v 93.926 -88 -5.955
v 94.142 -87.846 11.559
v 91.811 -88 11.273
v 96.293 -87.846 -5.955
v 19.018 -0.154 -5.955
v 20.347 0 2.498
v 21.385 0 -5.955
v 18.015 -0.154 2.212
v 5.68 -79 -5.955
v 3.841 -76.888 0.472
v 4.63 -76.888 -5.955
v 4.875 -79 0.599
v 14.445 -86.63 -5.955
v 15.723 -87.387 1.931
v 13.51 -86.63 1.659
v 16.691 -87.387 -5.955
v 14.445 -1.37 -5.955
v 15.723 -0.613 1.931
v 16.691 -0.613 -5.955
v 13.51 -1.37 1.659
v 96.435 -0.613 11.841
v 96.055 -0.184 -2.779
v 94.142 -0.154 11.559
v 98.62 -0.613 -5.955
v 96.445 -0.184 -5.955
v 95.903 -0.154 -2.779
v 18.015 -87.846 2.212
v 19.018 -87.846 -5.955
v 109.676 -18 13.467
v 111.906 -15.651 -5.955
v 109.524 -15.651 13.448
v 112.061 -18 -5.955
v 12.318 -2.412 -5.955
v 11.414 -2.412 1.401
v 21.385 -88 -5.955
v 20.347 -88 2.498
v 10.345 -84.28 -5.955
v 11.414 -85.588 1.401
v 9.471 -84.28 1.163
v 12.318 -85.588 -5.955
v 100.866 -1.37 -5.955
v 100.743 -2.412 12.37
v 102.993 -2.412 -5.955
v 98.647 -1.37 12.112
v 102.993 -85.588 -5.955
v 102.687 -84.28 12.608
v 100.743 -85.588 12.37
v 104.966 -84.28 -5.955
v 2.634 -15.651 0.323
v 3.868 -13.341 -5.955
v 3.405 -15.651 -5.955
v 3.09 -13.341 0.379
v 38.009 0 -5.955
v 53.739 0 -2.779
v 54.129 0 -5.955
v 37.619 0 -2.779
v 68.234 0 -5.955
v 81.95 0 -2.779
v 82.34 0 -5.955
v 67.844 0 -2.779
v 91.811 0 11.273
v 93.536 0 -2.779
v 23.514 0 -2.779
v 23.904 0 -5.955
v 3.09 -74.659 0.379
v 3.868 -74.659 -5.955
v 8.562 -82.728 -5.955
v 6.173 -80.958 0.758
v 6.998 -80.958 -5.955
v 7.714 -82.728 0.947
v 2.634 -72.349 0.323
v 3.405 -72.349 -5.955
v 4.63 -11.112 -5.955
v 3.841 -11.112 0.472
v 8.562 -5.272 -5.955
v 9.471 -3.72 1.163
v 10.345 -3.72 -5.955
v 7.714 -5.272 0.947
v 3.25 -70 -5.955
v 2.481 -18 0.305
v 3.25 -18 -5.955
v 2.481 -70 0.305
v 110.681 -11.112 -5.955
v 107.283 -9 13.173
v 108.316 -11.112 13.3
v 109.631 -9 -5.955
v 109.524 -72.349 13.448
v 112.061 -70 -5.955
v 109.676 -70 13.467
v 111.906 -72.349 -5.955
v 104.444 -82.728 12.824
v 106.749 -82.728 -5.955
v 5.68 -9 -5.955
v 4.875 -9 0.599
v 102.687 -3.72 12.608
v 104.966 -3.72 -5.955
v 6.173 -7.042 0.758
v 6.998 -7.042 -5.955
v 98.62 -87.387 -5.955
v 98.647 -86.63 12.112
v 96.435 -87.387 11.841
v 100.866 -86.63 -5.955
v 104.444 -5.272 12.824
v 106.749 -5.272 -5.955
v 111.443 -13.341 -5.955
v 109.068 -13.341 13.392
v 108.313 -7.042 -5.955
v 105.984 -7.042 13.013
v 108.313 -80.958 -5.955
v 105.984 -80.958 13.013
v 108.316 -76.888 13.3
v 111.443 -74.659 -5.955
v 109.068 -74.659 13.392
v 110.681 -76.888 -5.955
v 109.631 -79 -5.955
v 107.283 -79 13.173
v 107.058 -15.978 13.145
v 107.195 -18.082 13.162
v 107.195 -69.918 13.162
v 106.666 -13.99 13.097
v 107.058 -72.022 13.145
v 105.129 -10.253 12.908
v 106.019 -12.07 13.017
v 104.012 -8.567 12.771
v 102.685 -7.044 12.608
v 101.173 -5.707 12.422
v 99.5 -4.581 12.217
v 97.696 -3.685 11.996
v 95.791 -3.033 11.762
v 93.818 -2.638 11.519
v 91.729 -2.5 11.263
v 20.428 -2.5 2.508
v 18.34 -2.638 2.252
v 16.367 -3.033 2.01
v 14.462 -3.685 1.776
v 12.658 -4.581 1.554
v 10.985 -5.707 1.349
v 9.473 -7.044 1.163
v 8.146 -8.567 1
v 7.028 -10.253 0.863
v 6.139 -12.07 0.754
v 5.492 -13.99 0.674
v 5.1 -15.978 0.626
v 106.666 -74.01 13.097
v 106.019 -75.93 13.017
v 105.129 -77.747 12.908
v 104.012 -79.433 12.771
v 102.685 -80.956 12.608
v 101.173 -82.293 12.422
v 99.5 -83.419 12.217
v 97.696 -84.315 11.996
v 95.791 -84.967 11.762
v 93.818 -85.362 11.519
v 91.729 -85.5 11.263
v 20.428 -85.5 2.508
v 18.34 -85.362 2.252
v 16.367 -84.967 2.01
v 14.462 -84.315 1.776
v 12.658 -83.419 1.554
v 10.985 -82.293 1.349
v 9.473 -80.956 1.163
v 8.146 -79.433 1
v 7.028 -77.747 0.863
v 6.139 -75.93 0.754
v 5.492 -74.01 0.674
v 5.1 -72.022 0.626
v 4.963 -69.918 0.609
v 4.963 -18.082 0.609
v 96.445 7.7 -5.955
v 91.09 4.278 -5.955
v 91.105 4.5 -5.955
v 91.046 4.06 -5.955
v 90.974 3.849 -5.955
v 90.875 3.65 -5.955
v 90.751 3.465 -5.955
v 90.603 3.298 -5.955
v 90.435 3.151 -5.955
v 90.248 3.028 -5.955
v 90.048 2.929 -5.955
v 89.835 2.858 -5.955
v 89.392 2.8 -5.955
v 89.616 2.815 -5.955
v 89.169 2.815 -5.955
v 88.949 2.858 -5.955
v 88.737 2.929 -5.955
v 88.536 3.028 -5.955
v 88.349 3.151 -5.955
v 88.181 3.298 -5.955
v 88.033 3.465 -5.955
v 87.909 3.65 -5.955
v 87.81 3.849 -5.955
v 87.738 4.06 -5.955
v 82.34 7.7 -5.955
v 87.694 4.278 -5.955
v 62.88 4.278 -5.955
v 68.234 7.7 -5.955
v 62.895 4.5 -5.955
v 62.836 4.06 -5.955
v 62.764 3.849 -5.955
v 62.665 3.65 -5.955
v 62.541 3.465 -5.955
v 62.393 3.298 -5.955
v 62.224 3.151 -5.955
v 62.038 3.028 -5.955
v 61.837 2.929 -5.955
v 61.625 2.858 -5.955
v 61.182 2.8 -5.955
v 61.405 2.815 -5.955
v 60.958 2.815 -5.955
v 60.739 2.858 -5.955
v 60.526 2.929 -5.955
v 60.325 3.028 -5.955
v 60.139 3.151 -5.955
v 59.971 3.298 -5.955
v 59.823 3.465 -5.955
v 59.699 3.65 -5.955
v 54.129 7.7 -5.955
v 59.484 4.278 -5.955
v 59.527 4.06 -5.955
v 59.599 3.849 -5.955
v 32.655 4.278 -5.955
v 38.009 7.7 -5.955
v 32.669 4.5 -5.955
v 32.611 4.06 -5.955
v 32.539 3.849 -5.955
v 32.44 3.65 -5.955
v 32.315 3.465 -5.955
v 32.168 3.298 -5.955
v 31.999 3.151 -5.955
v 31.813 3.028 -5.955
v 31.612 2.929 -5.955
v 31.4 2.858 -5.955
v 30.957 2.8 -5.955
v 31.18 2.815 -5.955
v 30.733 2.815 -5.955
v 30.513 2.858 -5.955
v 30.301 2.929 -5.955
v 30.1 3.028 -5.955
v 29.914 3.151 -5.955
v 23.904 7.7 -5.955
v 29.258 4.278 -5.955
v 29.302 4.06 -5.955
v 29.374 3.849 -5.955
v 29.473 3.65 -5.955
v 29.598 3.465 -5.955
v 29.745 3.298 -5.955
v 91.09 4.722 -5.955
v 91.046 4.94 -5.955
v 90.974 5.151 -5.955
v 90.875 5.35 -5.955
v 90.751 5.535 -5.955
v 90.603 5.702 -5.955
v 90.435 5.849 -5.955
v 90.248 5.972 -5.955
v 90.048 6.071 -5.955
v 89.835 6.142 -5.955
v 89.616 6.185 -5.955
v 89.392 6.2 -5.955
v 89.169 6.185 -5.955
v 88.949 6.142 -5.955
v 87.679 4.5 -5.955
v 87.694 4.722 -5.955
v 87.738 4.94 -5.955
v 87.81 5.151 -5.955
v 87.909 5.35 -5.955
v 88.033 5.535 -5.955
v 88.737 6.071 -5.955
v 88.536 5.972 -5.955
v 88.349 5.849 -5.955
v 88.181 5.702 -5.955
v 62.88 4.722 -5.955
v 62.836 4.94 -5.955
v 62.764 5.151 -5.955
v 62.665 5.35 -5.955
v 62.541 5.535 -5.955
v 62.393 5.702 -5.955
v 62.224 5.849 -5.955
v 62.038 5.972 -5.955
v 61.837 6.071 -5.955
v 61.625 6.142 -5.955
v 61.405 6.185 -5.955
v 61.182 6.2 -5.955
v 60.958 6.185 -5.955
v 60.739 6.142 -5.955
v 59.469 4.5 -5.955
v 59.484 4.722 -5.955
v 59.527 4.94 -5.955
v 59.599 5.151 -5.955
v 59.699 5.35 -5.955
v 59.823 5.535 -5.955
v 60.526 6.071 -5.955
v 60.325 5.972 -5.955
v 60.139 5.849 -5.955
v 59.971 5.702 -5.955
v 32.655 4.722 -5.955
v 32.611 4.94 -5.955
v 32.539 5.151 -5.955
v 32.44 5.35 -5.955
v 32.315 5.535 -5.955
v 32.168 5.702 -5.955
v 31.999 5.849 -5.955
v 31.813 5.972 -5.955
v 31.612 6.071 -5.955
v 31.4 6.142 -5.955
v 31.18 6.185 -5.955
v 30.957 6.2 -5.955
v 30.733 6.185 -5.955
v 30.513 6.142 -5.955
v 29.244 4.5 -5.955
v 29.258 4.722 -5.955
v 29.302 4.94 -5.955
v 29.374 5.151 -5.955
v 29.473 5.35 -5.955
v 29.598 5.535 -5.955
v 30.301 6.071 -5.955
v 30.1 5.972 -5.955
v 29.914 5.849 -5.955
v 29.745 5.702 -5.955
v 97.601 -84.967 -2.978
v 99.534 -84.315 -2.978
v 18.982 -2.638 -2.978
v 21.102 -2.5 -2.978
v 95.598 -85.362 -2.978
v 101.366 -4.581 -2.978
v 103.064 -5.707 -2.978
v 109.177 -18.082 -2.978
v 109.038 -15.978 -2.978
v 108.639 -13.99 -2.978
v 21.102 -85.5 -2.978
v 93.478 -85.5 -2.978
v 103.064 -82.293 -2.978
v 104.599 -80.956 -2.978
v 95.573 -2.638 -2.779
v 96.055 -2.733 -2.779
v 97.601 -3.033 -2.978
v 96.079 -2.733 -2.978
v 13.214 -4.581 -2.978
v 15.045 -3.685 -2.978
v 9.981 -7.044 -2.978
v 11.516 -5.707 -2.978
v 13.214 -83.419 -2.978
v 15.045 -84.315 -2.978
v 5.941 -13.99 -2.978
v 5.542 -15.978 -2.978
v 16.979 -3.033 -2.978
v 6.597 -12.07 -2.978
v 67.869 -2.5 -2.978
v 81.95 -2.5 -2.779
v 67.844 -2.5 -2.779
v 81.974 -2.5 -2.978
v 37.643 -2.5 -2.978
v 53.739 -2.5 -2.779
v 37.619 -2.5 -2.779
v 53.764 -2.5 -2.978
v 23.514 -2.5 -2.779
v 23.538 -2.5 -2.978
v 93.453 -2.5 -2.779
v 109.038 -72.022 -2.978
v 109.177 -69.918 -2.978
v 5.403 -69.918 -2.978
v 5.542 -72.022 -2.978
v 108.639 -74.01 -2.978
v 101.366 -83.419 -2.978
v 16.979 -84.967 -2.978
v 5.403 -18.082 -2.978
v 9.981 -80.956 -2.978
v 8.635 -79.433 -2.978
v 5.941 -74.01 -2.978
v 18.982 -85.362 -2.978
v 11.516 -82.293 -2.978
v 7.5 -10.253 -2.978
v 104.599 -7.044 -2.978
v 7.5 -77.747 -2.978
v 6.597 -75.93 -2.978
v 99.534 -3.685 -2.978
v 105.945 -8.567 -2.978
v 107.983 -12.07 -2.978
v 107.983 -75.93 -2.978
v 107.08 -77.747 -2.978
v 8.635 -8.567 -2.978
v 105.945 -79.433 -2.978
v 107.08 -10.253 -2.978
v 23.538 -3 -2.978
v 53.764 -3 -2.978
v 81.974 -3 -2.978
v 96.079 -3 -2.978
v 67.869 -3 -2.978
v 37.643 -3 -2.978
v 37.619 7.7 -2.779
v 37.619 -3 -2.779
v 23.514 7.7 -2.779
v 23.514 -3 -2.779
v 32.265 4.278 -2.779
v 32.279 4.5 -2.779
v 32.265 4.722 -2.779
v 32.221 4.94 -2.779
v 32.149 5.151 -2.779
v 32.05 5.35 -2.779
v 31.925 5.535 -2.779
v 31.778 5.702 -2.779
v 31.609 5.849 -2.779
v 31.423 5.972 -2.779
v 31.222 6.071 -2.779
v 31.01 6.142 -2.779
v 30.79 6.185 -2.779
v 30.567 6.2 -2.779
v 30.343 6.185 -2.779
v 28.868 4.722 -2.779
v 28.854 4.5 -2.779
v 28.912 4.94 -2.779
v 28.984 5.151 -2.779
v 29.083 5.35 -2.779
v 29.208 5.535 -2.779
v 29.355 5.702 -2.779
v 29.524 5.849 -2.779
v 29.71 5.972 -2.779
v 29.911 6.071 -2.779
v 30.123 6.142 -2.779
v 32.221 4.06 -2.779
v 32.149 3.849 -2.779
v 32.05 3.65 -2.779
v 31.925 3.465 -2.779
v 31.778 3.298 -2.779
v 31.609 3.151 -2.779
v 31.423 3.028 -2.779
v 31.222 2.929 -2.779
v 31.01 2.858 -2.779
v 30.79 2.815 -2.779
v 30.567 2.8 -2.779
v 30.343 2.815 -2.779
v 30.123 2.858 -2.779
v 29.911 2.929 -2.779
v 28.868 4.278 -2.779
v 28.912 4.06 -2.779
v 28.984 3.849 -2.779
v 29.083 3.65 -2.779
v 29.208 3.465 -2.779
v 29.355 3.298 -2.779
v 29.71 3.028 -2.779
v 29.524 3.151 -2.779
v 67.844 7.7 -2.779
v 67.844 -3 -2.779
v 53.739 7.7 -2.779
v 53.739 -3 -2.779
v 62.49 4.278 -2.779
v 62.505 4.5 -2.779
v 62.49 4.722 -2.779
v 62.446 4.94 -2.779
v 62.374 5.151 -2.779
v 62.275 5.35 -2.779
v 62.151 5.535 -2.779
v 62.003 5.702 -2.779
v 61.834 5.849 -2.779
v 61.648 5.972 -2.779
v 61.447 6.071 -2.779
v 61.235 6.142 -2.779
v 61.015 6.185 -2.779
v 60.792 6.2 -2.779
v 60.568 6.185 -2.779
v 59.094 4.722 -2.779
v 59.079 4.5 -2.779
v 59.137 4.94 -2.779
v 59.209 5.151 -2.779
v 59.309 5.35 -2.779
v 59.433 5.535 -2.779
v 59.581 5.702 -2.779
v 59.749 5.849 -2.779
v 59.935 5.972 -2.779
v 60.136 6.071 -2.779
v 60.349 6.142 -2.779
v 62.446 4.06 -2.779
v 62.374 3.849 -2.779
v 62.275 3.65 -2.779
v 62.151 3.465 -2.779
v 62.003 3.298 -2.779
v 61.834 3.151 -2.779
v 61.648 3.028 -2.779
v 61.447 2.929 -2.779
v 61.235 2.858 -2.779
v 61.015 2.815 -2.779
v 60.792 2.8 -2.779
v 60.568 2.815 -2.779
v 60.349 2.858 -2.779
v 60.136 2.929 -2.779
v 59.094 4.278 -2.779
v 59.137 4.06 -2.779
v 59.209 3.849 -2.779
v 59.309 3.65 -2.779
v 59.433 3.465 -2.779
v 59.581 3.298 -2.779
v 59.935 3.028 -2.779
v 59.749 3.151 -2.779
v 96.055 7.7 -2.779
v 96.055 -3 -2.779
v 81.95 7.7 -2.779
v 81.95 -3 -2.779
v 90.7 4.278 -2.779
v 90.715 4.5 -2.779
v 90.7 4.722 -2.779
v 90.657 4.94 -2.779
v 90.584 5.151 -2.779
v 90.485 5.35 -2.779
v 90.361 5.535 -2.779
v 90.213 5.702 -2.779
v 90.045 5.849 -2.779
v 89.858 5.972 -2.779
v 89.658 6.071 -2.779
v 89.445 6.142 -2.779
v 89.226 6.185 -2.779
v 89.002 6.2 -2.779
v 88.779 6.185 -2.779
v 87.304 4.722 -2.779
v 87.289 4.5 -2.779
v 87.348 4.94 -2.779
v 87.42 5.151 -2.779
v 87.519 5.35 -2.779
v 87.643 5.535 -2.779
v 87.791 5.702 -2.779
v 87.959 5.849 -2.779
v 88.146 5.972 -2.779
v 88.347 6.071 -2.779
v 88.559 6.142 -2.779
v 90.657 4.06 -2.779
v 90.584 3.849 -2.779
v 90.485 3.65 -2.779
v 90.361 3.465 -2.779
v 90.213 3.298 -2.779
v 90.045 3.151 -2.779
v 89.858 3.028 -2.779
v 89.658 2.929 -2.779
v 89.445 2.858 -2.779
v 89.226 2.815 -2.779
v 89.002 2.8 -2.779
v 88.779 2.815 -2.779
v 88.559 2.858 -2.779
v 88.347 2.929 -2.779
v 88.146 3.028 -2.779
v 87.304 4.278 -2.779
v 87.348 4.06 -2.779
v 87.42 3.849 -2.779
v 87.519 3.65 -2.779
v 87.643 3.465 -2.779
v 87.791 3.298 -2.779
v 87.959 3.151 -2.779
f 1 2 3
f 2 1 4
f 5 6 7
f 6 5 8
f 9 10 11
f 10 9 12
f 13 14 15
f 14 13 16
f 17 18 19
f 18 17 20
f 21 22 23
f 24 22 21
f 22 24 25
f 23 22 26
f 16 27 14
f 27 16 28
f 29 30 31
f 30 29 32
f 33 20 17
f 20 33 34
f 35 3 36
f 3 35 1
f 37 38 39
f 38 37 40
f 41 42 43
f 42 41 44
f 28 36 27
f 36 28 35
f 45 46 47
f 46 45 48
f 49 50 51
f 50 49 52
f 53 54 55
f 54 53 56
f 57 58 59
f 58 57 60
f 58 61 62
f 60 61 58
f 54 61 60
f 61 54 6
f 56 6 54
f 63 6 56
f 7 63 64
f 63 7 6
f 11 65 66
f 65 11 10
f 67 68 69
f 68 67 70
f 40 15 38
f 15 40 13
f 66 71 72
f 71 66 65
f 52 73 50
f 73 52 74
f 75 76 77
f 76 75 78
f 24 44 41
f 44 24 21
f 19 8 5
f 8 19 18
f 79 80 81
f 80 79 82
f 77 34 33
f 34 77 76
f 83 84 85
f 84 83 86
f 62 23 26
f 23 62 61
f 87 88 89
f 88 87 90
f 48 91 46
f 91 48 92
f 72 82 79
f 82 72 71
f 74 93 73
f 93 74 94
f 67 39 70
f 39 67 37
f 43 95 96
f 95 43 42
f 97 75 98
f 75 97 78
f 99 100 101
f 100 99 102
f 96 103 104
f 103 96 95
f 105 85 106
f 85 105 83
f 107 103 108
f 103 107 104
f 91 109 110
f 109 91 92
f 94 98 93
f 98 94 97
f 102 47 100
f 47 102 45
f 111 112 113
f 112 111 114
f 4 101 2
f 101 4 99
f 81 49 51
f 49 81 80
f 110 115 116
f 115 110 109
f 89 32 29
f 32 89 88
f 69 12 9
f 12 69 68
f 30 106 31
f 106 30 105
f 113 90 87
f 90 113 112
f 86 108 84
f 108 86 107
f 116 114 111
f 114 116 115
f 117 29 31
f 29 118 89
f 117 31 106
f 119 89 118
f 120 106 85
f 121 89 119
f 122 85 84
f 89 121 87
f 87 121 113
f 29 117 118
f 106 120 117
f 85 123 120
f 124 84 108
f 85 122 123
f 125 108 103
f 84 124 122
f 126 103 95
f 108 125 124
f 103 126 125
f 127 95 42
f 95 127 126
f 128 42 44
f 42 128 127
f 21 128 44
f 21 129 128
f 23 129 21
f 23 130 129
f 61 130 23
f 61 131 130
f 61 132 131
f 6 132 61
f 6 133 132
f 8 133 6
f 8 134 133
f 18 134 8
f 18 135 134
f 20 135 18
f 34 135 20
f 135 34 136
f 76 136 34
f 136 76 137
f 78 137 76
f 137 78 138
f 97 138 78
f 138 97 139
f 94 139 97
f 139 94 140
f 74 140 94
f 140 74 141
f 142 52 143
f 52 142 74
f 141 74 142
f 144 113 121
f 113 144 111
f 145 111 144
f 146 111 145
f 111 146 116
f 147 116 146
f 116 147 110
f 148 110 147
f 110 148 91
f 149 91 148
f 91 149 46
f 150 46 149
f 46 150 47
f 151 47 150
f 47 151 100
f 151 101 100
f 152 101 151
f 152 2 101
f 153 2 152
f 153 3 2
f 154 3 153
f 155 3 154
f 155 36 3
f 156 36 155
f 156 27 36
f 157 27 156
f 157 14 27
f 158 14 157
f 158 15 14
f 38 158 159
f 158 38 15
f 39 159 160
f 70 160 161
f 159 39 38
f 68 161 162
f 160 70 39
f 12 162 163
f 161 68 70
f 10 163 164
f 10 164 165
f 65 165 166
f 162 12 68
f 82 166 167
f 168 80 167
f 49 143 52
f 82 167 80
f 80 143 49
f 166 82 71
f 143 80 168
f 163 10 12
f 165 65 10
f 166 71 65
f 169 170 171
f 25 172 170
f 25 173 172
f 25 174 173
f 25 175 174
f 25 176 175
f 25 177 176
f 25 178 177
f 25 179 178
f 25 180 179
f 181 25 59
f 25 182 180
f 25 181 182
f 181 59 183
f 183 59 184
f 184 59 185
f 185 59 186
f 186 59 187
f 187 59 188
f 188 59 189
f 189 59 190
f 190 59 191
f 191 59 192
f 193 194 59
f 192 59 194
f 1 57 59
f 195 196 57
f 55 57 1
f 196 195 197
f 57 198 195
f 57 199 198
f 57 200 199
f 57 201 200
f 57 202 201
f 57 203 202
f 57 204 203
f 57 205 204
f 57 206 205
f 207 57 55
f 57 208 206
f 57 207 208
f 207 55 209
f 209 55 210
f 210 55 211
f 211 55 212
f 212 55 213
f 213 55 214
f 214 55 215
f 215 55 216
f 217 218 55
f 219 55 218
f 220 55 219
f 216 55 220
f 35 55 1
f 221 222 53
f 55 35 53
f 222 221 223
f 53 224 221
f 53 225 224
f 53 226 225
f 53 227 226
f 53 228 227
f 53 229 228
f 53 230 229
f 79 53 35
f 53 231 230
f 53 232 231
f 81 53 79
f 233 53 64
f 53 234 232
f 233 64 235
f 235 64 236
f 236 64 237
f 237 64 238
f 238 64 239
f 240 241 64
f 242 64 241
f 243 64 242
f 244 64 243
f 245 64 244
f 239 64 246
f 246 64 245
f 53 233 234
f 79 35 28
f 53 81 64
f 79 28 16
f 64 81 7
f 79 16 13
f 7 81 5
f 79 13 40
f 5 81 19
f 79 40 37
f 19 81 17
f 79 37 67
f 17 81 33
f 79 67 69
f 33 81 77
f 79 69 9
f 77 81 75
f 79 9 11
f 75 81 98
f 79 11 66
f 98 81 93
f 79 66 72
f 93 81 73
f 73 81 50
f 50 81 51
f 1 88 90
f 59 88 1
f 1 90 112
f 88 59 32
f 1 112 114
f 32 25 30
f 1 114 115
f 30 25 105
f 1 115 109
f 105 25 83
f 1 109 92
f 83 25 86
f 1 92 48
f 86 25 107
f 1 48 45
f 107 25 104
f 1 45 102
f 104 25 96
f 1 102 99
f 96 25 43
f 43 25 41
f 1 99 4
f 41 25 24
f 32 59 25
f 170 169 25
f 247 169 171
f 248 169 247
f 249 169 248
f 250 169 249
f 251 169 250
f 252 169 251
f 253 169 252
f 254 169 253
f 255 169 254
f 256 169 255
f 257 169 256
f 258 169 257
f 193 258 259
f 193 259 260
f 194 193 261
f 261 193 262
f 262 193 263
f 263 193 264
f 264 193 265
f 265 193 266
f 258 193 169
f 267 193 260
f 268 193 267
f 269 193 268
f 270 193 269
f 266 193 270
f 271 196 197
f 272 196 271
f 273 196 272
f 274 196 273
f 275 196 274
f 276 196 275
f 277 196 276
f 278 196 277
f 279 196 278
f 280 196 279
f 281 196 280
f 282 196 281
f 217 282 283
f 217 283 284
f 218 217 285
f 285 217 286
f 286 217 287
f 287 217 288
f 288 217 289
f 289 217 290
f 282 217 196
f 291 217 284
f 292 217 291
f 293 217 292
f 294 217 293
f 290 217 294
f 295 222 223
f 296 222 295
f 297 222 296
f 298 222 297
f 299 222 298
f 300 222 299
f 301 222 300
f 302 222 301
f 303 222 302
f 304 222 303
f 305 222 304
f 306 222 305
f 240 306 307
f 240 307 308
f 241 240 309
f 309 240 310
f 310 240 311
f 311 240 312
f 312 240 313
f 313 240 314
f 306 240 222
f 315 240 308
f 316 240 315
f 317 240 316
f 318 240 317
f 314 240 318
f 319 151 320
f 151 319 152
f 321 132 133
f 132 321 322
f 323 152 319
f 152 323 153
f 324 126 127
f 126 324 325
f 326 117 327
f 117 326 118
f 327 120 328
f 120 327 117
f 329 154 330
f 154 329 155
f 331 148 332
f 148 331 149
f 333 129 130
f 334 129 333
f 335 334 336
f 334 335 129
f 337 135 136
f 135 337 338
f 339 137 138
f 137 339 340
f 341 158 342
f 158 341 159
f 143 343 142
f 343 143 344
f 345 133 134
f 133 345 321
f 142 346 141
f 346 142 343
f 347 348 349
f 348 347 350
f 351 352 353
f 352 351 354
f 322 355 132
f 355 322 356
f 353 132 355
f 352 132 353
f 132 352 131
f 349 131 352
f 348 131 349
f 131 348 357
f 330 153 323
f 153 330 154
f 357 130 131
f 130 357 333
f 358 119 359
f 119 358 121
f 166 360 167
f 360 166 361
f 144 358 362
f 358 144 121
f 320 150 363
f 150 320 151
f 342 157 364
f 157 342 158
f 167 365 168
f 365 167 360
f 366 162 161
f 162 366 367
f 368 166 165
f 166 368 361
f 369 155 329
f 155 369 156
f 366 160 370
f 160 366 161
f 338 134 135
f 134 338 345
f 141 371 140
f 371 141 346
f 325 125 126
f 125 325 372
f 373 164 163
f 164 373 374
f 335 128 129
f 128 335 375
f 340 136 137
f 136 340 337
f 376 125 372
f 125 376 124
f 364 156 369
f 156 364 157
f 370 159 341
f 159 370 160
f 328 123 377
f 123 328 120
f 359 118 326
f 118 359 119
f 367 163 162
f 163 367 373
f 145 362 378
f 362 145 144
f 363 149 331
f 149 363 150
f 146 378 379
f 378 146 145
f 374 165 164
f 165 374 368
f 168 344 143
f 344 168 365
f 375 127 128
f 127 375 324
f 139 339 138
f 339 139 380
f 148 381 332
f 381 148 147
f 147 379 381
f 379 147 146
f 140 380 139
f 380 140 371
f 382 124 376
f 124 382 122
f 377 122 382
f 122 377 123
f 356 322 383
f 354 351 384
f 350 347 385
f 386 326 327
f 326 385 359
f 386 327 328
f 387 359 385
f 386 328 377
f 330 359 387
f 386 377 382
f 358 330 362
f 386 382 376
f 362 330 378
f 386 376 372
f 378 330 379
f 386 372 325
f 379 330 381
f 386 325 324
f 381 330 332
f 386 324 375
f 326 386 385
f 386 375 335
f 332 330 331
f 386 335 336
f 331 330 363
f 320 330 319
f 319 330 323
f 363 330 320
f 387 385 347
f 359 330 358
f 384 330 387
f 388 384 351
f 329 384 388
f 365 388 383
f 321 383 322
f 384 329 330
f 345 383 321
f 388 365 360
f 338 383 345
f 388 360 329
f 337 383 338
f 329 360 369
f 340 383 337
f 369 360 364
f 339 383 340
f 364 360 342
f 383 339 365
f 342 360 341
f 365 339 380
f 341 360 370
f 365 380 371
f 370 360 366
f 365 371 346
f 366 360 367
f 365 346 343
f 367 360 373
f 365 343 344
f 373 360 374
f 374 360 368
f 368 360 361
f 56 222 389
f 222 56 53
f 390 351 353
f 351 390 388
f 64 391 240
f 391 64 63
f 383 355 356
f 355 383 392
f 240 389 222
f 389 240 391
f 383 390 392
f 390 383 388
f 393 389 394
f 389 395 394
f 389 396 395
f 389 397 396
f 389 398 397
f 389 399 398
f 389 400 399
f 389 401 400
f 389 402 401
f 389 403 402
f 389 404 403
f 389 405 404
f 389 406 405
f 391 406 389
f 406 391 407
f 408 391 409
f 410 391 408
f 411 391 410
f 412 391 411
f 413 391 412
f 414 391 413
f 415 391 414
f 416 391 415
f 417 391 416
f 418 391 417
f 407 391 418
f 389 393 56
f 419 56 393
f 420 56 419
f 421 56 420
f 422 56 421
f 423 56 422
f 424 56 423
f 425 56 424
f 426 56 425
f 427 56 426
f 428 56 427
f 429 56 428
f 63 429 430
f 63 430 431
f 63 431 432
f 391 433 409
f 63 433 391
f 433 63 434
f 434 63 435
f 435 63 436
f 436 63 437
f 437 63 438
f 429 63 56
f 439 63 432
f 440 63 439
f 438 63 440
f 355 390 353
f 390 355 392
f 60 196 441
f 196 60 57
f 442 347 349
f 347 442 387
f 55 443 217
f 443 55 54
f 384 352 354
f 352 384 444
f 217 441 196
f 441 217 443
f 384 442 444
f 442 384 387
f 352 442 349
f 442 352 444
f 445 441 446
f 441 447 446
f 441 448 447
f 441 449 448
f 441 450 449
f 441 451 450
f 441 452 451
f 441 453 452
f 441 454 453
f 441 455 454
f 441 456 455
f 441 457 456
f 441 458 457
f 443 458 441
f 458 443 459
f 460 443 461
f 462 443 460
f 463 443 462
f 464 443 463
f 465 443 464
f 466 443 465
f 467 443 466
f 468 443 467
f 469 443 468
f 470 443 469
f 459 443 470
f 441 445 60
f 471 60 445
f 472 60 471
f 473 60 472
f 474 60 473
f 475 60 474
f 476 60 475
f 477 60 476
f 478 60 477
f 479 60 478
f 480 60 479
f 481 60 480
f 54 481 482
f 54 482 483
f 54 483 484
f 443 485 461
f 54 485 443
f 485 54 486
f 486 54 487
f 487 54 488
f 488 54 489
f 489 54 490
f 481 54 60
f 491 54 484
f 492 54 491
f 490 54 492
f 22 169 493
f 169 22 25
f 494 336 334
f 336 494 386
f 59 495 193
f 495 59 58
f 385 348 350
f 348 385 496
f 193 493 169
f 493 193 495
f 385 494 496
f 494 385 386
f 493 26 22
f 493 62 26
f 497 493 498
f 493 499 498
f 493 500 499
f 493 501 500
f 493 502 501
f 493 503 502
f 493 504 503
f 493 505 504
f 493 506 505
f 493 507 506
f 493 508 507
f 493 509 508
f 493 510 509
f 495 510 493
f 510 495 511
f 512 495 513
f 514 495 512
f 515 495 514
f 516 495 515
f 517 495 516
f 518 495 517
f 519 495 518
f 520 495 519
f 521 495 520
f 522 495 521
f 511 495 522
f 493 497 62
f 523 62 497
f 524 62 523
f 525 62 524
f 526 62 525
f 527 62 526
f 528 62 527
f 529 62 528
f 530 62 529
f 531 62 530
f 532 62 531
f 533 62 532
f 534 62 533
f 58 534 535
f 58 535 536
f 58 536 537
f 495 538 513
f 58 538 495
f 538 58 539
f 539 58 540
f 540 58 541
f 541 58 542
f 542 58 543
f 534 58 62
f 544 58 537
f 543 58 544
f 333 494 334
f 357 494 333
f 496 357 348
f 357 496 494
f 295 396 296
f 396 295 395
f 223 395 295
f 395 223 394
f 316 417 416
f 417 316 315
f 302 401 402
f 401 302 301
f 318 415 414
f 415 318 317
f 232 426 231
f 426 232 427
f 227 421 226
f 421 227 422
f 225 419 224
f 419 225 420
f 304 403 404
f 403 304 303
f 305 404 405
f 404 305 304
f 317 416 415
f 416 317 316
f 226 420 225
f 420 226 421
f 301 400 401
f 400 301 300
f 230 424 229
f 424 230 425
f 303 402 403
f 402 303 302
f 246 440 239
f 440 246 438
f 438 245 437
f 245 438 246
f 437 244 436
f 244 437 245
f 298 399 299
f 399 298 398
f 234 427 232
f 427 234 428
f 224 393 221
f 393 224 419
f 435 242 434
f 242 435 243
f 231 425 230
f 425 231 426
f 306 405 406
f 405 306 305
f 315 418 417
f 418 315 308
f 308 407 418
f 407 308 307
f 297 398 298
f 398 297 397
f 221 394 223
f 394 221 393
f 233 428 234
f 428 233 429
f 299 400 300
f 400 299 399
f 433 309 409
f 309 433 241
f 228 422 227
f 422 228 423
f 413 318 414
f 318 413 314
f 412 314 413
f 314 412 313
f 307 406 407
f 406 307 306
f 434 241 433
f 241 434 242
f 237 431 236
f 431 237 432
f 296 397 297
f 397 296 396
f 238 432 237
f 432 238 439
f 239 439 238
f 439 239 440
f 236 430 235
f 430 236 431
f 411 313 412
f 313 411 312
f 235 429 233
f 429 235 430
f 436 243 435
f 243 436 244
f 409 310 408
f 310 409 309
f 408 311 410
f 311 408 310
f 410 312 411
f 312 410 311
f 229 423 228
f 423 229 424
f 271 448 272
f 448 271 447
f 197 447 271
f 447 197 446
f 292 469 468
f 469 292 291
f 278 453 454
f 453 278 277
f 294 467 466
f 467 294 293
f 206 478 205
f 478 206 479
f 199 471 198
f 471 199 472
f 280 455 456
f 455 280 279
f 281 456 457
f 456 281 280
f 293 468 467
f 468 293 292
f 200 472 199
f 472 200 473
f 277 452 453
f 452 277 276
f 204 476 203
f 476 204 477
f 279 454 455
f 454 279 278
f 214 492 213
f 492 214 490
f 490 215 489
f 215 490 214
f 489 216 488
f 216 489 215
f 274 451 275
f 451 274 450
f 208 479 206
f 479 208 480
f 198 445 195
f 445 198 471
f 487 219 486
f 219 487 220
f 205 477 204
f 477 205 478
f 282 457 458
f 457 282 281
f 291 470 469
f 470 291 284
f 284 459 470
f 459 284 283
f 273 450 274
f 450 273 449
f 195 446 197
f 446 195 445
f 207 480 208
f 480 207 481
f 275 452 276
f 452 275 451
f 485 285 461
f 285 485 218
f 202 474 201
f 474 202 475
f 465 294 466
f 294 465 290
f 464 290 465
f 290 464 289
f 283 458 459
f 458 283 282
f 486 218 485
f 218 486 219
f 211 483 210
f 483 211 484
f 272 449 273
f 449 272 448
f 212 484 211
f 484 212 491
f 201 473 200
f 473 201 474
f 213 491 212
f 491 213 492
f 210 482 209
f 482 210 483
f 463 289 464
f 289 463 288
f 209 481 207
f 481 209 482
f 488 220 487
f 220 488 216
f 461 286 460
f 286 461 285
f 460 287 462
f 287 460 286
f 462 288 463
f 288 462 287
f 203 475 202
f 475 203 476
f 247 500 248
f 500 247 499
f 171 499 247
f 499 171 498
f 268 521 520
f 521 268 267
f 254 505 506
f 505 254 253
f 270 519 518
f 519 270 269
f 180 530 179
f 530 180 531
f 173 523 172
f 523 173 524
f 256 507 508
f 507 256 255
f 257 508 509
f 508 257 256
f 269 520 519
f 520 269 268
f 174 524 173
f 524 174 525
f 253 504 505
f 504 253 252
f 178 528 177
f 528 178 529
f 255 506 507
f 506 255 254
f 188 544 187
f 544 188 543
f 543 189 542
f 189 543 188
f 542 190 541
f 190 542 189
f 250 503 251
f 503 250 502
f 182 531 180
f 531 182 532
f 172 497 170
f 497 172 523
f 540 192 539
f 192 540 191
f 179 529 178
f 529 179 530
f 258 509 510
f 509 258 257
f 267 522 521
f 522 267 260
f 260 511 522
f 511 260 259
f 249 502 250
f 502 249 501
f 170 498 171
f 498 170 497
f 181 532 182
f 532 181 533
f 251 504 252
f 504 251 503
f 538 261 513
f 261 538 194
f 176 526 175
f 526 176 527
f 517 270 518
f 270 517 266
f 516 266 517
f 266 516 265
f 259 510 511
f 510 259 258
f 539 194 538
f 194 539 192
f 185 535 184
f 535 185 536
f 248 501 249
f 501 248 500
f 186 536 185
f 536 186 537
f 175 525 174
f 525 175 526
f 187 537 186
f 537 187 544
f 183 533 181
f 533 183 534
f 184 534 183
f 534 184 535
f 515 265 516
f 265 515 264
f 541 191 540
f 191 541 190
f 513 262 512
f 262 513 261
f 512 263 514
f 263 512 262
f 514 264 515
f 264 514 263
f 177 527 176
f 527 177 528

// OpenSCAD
// file: ../keyball61_outline.scad
// 自動生成: scripts/extract_outline.py による Keyball61 BallSide 底板の実寸データ
// 座標系: 左手ユニットを上から見た形 / 原点=外形バウンディングボックスの南西角 / +Y=奥(北)
// 編集しないこと。再生成: python3 scripts/extract_outline.py <DXF>
plate_w = 142.99;
plate_d = 113.53;
plate_outline = [
  [70.469,105.952],
  [71.227,105.880],
  [80.812,104.031],
  [81.588,103.958],
  [100.075,104.045],
  [100.583,104.091],
  [119.410,107.418],
  [119.914,107.553],
  [136.160,113.466],
  [136.328,113.511],
  [136.502,113.527],
  [136.676,113.511],
  [136.844,113.466],
  [137.002,113.393],
  [137.145,113.293],
  [137.268,113.169],
  [137.368,113.027],
  [137.442,112.869],
  [142.931,97.786],
  [142.980,97.597],
  [142.990,97.401],
  [142.963,97.207],
  [142.898,97.022],
  [142.798,96.853],
  [142.667,96.707],
  [142.510,96.589],
  [142.334,96.505],
  [134.323,93.589],
  [133.849,93.368],
  [133.421,93.068],
  [133.051,92.698],
  [132.751,92.270],
  [132.530,91.796],
  [132.395,91.291],
  [132.349,90.770],
  [132.349,66.014],
  [132.366,65.834],
  [132.414,65.660],
  [132.493,65.498],
  [132.600,65.353],
  [132.731,65.228],
  [132.882,65.130],
  [133.048,65.060],
  [133.215,64.991],
  [133.367,64.892],
  [133.498,64.768],
  [133.604,64.623],
  [133.683,64.461],
  [133.732,64.286],
  [133.748,64.107],
  [133.748,29.050],
  [133.748,6.000],
  [133.729,5.805],
  [133.672,5.618],
  [133.580,5.445],
  [133.455,5.293],
  [133.304,5.169],
  [133.131,5.076],
  [132.943,5.019],
  [132.748,5.000],
  [95.252,5.000],
  [95.056,4.981],
  [94.869,4.925],
  [94.696,4.832],
  [94.544,4.707],
  [94.420,4.556],
  [94.328,4.383],
  [94.271,4.195],
  [94.252,4.001],
  [94.252,3.501],
  [94.232,3.305],
  [94.175,3.118],
  [94.083,2.945],
  [93.959,2.793],
  [93.807,2.669],
  [93.634,2.577],
  [93.447,2.520],
  [93.251,2.500],
  [76.201,2.500],
  [76.006,2.481],
  [75.819,2.424],
  [75.646,2.332],
  [75.494,2.207],
  [75.370,2.056],
  [75.277,1.883],
  [75.220,1.696],
  [75.201,1.500],
  [75.201,1.001],
  [75.182,0.805],
  [75.125,0.617],
  [75.033,0.445],
  [74.908,0.293],
  [74.757,0.169],
  [74.584,0.077],
  [74.396,0.019],
  [74.201,0.000],
  [58.151,0.000],
  [57.977,0.015],
  [57.809,0.061],
  [57.651,0.134],
  [57.508,0.234],
  [57.385,0.358],
  [57.285,0.500],
  [57.211,0.658],
  [57.166,0.827],
  [57.151,1.001],
  [57.151,3.700],
  [57.132,3.895],
  [57.075,4.083],
  [56.982,4.256],
  [56.858,4.407],
  [56.706,4.532],
  [56.534,4.624],
  [56.346,4.681],
  [56.151,4.700],
  [39.101,4.700],
  [38.927,4.715],
  [38.758,4.761],
  [38.600,4.834],
  [38.458,4.935],
  [38.334,5.057],
  [38.235,5.200],
  [38.161,5.358],
  [38.116,5.527],
  [38.101,5.700],
  [38.101,10.700],
  [38.081,10.895],
  [38.024,11.083],
  [37.932,11.256],
  [37.808,11.408],
  [37.656,11.532],
  [37.483,11.624],
  [37.296,11.681],
  [37.101,11.701],
  [19.050,11.701],
  [1.000,11.701],
  [0.805,11.720],
  [0.617,11.777],
  [0.445,11.869],
  [0.293,11.993],
  [0.168,12.145],
  [0.076,12.317],
  [0.019,12.506],
  [0.000,12.701],
  [0.000,104.952],
  [0.015,105.125],
  [0.060,105.294],
  [0.134,105.452],
  [0.234,105.595],
  [0.357,105.718],
  [0.500,105.818],
  [0.658,105.892],
  [0.826,105.937],
  [1.000,105.952],
  [19.050,105.952]
];
// [x, y, 直径] : d=11.3 はボール取出し穴, d=2.08 は M2, d=2.36 はボールケース部
plate_holes = [
  [71.961,95.252,12.0],
  [61.104,103.252,2.5],
  [61.104,87.252,2.5],
  [56.455,61.351,2.2],
  [128.785,88.912,2.2],
  [57.292,18.55,2.2],
  [18.773,87.402,2.2],
  [18.773,30.251,2.2],
  [94.556,21.051,2.2],
  [95.392,61.651,2.2],
  [120.871,101.715,2.2]
];
// file: ../params.scad
// ============================================================
// Keyball61 ラップボード(膝上ケース・固定式) 共通パラメータ
// 座標系: X+ = 右(東), Y+ = 奥(北), Z+ = 上
// 組立座標系(グローバル): 中心 x=0, 手前が y小
// ============================================================

clr = 0.35;           // はめあいクリアランス(片側)

// ---------- 全体レイアウト(固定) ----------
splay        = 10;    // ハの字角(固定)。変更したら全パーツ再印刷
tent_angle   = 7;     // テンティング角(内側が高い)
kb_corner_x  = 45;    // キーボードブロック後内側コーナーの中心からの距離(=後方ギャップの半分)
kb_corner_y  = 238;   // 同コーナーのY

// ---------- サイドピース(キーボードブロック+パームレスト) ----------
kb_wall      = 6;     // ポケット周囲の壁厚
wedge_t0     = 6;     // 楔の最低肉厚(外側端)
palm_w       = 108;   // パームレスト幅。親指側(内側)を削って印刷を安定させる
palm_x0      = 2.5;   // パームの外側エッジ位置(kbフレームx)。外側基準で幅を詰める
palm_d       = 88;    // 同奥行き
palm_overlap = 3;     // キーボードブロックへの食い込み
palm_r       = 18;    // 角R
// ブレース南帯のネジ座/座面が載る内側エッジ沿いの支持アーム
// (パームを削ってもブレース・ブリッジとの接合部を変えないために残す)
palm_arm_w   = 14;    // アーム幅(継ぎ目から西へ)
palm_arm_y0  = -32;   // アーム南端(kbフレームy)
palm_fillet  = 22;    // アーム〜パーム間の凹R(尖り解消の滑らかな輪郭)
// キーボードは「ベッド直接印刷の2mm取付プレート」(mount_plate)に純正ネジで固定し、
// プレートごとポケットに落としてM3x8皿でサイドに固定する。
// (楔内部の座ぐり奥の2mm肉は印刷精度が出ずネジ固定に失敗したため=実印刷での知見)
plate_t      = 2;     // 取付プレート厚(=アクリル板厚。純正ネジ長がそのまま使える)
pocket_depth = 4.6;   // ポケット深さ = plate_t + 縁2.6
// プレート固定ネジ位置(プレート座標系, M3x8皿セルフタップ x4/側)
// 組立順: 先にプレート単体をサイドへ上から固定 → キーボードをΦ8貫通穴経由で下から純正ネジ止め
plate_screws = [[35, 14], [95, 14], [35, 96], [105, 99]];
kb_head_hole_d = 8;   // M2/ボールケースネジ頭の逃げ穴(サイド側, 貫通=下から増し締め可)

ball_hole_d  = 12;    // ボール取出し穴(アクリルは11.3)

// 取付プレートの穴径
m2_hole_d  = 2.4;     // M2クリアランス(プレート側)
bc_hole_d  = 2.8;     // ボールケースネジ(プレート側, アクリルは2.36)

// ボールPCB切り欠き部の逃げ(取付面からさらに掘り下げる深さ)
notch_relief = 4;

// ---------- 中央ブリッジ ----------
bridge_t     = 8;     // ブリッジ板厚
bridge_y0    = 88;    // 南端(ここより手前の中央は開放空間)
bridge_y1    = 250;   // 北端
seam_clr     = 0.5;   // サイドとの隙間
ledge_w      = 25;    // 継手タブ幅(サイド下面のポケットに入る)
ledge_t      = 3.6;   // タブ厚
tab_len      = 26;    // タブの継ぎ目方向長さ(サイド側ポケット天井のブリッジ距離。
                      //  ポケットは前後の壁で両端支持されるのでサポート不要)
joint_screw_ys = [110, 165, 220];  // 継手ネジのY(斜め継ぎ目沿い・片側3本)
joint_screw_inset = 10;            // 楔エッジからネジ中心までの距離
joint_y0 = 95;                     // 連続タブのY範囲
joint_y1 = 235;
// リブ入り連続継手: サイドの連続タブ(凸)の切り欠きに、ブリッジ側ポケット(凹)内の
// リブが噛み合う。リブがポケット天井の中間支柱になり、ブリッジは
// 両端支持の約28mmブリッジ×5区間でサポート不要のまま連続かみ合いにできる
joint_rib_ys = [122.7, 150.9, 179.1, 207.3];  // リブ中心Y(ネジ位置を回避)
joint_rib_w  = 3;                  // リブ幅(サイド側切り欠きは +2*clr)

// ---------- ブレースプレート(上側の左右連結・箱構造化) ----------
// ポッドの上を跨いで左右サイドの内壁上面に渡し、M3x8皿セルフタップ x2/側で固定。
// OLED/ProMicro部(奥側)を避けた範囲に架ける
brace_t       = 3.5;   // プレート厚
brace_y0      = 100;   // 南端
brace_y1      = 230;   // 北端(ケーブル類はブレースの上か切り欠き部を通す)
// TRSジャック(グローバル x≈∓72, y≈181, KiCad基板から実測)のプラグ/ケーブルが
// 降りてくるゾーンを、左右エッジの切り欠きで大きく避ける(H形)
brace_notch_y0 = 168;  // 切り欠きY範囲
brace_notch_y1 = 212;
brace_notch_keep = 37; // 切り欠き部で残す中央帯の半幅
brace_shelf_z = 22.2;  // サイド側座面の高さ(バッテリー版ポッド上面21.4+0.8クリア)
brace_shelf_w = 10;    // 座面幅(継ぎ目から内側へ)
brace_overlap = 9.5;   // プレートが座面に乗る幅(段差壁との隙間はブリッジ継ぎ目と同じ0.5mm)
brace_screw_ys = [108, 154, 221];  // 固定ネジY(片側3本)
// 親指キークラスタの張り出し回避: 南ネジと中央ネジの間のエッジを少し中央寄りに後退
brace_thumb_y0    = 114;  // 回避Y範囲
brace_thumb_y1    = 147;
brace_thumb_inset = 12;   // 継ぎ目から中央側への後退量
brace_screw_inset = 5;        // 継ぎ目からネジ中心までの距離

// M3 (継手・ポッド固定)
m3_hole_d  = 3.4;
m3_cs_d    = 6.8;     // 皿ざぐり径
m3_nut_af  = 5.8;     // 六角ナットポケット対辺(M3ナット5.5+0.3)
m3_nut_t   = 2.9;     // 同深さ

// ---------- Touch ID ポッド ----------
// 実測値(2026-08-14): 基板 85x31x3 / ボタン 16x16x3 / ポート 19x3.1
// 薄型バッテリー 123x30x3 (有りの場合は基板の下に縦積み)
tid_battery = false; // バッテリー版は -D tid_battery=true で生成 (make で両STL生成)
tid_bat_l  = 123;
tid_bat_t  = 3;
tid_bay_w  = 34;    // ベイ幅   (基板短辺31 + 余裕)
tid_bay_d  = tid_battery ? tid_bat_l + 3 : 88;  // ベイ奥行
tid_bay_h  = tid_battery ? 7 : 4;               // 電池3+基板3+余裕 / 基板3+余裕
tid_btn_in_lid = false; // ボタンはケーブル延長してキーボード側に配置予定のため蓋穴なし
                        // (蓋にボタンを出す場合は true に)
tid_btn_w  = 16;    // センサーボタン一辺(正方形) → 蓋の角穴 = +2*clr
tid_btn_x  = 0;     // ベイ中心からのボタン中心オフセットX
tid_btn_y  = -28;   // 同Y(手前が負)。※ボタン実位置に合わせて調整
tid_port_w = 20;    // 充電ポート開口幅(南面, 上開きスロット) 実測19 / 0で無効
tid_port_off = 0;   // ポート左右オフセット(※あとで調整)
tid_pedestal_h = 0; // ボタン下の台座高さ(0=無効)
tid_wall   = 3;
tid_lid_t  = 2.4;

pod_screw_span = 48;  // フランジ穴スパン(ブリッジの穴と一致)
pod_y          = 178; // ブリッジ側の取付穴Y(両バージョン共通・固定)
// バッテリー版はベイが南へ伸びるぶんフランジ穴をオフセットし、
// 取付穴とポッド北端を両バージョンで揃える
pod_flange_off = tid_battery ? 19 : 0;

$fn = 48;
// file: ../lib.scad
// 共通モジュール
include <params.scad>
include <keyball61_outline.scad>

// キーボードブロック外形(kbローカル座標系)
kbw = plate_w + 2 * kb_wall;   // 幅
kbd = plate_d + 2 * kb_wall;   // 奥行き

// ---- テンティング用の傾斜半空間(kbローカル座標系) ----
// 上面平面: z = wedge_t0 + dz + x*tan(tent_angle)  (x=0 が外側=低い側)
module halfspace_below_top(dz = 0) {
    translate([0, 0, wedge_t0 + dz])
        rotate([0, -tent_angle, 0])
            translate([-1000, -500, -2000]) cube([3000, 2000, 2000]);
}
module halfspace_above_top(dz = 0) {
    translate([0, 0, wedge_t0 + dz])
        rotate([0, -tent_angle, 0])
            translate([-1000, -500, 0]) cube([3000, 2000, 2000]);
}

// kbローカルxにおける上面/ポケット床の高さ
function kb_top_z(x) = wedge_t0 + x * tan(tent_angle);
function pocket_floor_z(x) = kb_top_z(x) - pocket_depth;

// 継ぎ目: 左サイドの楔内側エッジのX(グローバル, 正値で返す)
// エッジは (kb_corner_x, kb_corner_y) から南へ向かって splay だけ開く
function seam_x(y) = kb_corner_x + (kb_corner_y - y) * tan(splay);

// ---- プレート外形(左手ユニット・上面視) ----
// DXFの描画は「右手ユニット上面視を180°回転」した状態なので、
// Y反転すると左手ユニット上面視(手前=ボール側, 奥=MCU/USB側)になる
module plate2d(off = 0) {
    translate([0, plate_d]) mirror([0, 1]) {
        if (off > 0) offset(r = off) polygon(plate_outline);
        else polygon(plate_outline);
    }
}

// Y反転済みの穴リスト [x, y, d]
plate_holes_f = [for (h = plate_holes) [h[0], plate_d - h[1], h[2]]];

// ---- 角丸長方形 ----
module rounded_rect(w, d, r) {
    offset(r = r) offset(delta = -r) square([w, d]);
}

// ---- M3 六角ナットポケット 原点=軸, z=0から上へ掘る ----
module m3_nut_pocket() {
    translate([0, 0, m3_nut_t/2 - 0.01])
        cylinder(d = m3_nut_af / cos(30), h = m3_nut_t + 0.02, center = true, $fn = 6);
}

// ---- M3 皿ネジ穴 原点=軸/z=0が頭側表面, 下向きに掘る ----
module m3_countersunk(depth) {
    translate([0, 0, -depth - 0.01]) cylinder(d = m3_hole_d, h = depth + 0.02);
    translate([0, 0, -(m3_cs_d - m3_hole_d)/2]) cylinder(d1 = m3_hole_d, d2 = m3_cs_d, h = (m3_cs_d - m3_hole_d)/2 + 0.01);
    translate([0, 0, -0.005]) cylinder(d = m3_cs_d, h = 5);
}
// file: v3_params.scad
// v3 モジュラー構造(中空箱+縦壁フランジ結合)の追加パラメータ
// ベース寸法・外形・レイアウトは ../params.scad / ../keyball61_outline.scad を共用
include <../lib.scad>

v3_wall     = 2.5;   // 箱の壁厚
v3_top      = 3;     // 天板厚(プレート座の下)
v3_joint_clr = 0.2;  // 箱同士の合わせ面クリアランス
// ジョイントは全て「垂直M3x8なべ + 横挿しナットスロット」方式。
// 上からドライバーで締結でき、ナットはスロットに事前挿入して回り止め。
// スロット天井2.5mmが締結面。ナットの対角(6.35)が軸の真下まで届く奥行きを取る
v3_slot_w = 5.9;   // ナットスロット幅(M3対辺5.5+0.4)
v3_slot_t = 2.7;   // 同厚(ナット2.4+0.3)

// KB箱⇔中央箱: KB東壁の切り欠き+受けボスへ中央箱のデッキ面一タブから縦M3
v3_cj_ys  = [120, 170, 220];

// KB箱⇔パーム箱: KB南壁の切り欠き+受けボスへパーム天板面一タブから縦M3
v3_pj_xs   = [30, 60, 88];  // パーム幅(2.5..110.5)内かつKB南壁上

// パーム箱(kbフレーム, KB箱の南に接続)
v3_palm_w  = 108;
v3_palm_x0 = 2.5;
v3_palm_d  = 88;

// 中央箱
v3_cbox_h  = 16;    // 高さ(トーションボックス。ブリッジ+ブレースの代替)
v3_cbox_y0 = 88;
v3_cbox_y1 = 250;
// 底蓋(あと付け可): 内周に収まる台形板をボス柱4本にM3x8皿で固定(頭は底面ツライチ)
v3_lid_t = 2.5;
v3_lid_bosses = [[-28, 95], [28, 95], [-28, 230], [28, 230]];  // ベルクロスロット(y242)を回避
// 結束バンド用スロット対 [中心x, 中心y]: 3x7の縦穴2個(±4.75mm)を1組として天板に開ける
v3_tie_pairs = [[-40, 120], [40, 120], [-40, 205], [40, 205]];
// file: v3_palm_box.scad
// v3 パームボックス: 差し替え式の楔シェル(リブなし・底面開放)。
// 「天面をベッドに伏せて」印刷すればブリッジゼロ(partsファイルで180°±tent回転済み)。
// 北端: 天板と面一のタブx3(厚3.2, 上面=楔面=印刷時のベッド接地面)が
// KBフレーム南壁の切り欠きに載り、
// 上から縦M3x8なべ→KB側ボスの横挿しナットスロットで締結(皿もみなしの
// ストレート穴。薄タブの縁を残して座面強度を確保)。頭はジェルパッドの下。
// kbフレーム基準(北端 y=0, タブは y>0 へ張り出す)。
include <v3_params.scad>

module v3_palm_fp2d() {
    translate([v3_palm_x0, -v3_palm_d]) rounded_rect(v3_palm_w, v3_palm_d, palm_r);
}

module v3_palm_box_left() {
    difference() {
        union() {
            // シェル(リブなし)
            difference() {
                intersection() {
                    linear_extrude(60) v3_palm_fp2d();
                    halfspace_below_top(0);
                }
                intersection() {
                    translate([0, 0, -1]) linear_extrude(62) offset(delta = -v3_wall) v3_palm_fp2d();
                    halfspace_below_top(-v3_top);
                }
            }
            // ジョイントタブ(楔面-3.2 .. 0 のスラブ。北端はネジ穴縁の肉1.5mmを確保)
            // 上面は天板と完全に面一: 伏せ印刷でタブも1層目からベッドに接する
            // (0.2下げるとタブだけ浮いて1層目が欠ける)
            for (jx = v3_pj_xs)
                intersection() {
                    translate([jx - 7, -3, 0]) cube([14, 10.7, 60]);
                    halfspace_below_top(0);
                    halfspace_above_top(-3.2);
                }
        }
        // タブのネジ穴(縦M3なべ用ストレート穴, KB側ボスのネジ穴位置 y=4.5)
        for (jx = v3_pj_xs)
            translate([jx, 4.5, kb_top_z(jx) - 4.5]) cylinder(d = 3.4, h = 6);
    }
}

module v3_palm_box_right() { mirror([1, 0, 0]) v3_palm_box_left(); }
// main file
include <v3_palm_box.scad>
rotate([0, 180 - tent_angle, 0]) v3_palm_box_right();
